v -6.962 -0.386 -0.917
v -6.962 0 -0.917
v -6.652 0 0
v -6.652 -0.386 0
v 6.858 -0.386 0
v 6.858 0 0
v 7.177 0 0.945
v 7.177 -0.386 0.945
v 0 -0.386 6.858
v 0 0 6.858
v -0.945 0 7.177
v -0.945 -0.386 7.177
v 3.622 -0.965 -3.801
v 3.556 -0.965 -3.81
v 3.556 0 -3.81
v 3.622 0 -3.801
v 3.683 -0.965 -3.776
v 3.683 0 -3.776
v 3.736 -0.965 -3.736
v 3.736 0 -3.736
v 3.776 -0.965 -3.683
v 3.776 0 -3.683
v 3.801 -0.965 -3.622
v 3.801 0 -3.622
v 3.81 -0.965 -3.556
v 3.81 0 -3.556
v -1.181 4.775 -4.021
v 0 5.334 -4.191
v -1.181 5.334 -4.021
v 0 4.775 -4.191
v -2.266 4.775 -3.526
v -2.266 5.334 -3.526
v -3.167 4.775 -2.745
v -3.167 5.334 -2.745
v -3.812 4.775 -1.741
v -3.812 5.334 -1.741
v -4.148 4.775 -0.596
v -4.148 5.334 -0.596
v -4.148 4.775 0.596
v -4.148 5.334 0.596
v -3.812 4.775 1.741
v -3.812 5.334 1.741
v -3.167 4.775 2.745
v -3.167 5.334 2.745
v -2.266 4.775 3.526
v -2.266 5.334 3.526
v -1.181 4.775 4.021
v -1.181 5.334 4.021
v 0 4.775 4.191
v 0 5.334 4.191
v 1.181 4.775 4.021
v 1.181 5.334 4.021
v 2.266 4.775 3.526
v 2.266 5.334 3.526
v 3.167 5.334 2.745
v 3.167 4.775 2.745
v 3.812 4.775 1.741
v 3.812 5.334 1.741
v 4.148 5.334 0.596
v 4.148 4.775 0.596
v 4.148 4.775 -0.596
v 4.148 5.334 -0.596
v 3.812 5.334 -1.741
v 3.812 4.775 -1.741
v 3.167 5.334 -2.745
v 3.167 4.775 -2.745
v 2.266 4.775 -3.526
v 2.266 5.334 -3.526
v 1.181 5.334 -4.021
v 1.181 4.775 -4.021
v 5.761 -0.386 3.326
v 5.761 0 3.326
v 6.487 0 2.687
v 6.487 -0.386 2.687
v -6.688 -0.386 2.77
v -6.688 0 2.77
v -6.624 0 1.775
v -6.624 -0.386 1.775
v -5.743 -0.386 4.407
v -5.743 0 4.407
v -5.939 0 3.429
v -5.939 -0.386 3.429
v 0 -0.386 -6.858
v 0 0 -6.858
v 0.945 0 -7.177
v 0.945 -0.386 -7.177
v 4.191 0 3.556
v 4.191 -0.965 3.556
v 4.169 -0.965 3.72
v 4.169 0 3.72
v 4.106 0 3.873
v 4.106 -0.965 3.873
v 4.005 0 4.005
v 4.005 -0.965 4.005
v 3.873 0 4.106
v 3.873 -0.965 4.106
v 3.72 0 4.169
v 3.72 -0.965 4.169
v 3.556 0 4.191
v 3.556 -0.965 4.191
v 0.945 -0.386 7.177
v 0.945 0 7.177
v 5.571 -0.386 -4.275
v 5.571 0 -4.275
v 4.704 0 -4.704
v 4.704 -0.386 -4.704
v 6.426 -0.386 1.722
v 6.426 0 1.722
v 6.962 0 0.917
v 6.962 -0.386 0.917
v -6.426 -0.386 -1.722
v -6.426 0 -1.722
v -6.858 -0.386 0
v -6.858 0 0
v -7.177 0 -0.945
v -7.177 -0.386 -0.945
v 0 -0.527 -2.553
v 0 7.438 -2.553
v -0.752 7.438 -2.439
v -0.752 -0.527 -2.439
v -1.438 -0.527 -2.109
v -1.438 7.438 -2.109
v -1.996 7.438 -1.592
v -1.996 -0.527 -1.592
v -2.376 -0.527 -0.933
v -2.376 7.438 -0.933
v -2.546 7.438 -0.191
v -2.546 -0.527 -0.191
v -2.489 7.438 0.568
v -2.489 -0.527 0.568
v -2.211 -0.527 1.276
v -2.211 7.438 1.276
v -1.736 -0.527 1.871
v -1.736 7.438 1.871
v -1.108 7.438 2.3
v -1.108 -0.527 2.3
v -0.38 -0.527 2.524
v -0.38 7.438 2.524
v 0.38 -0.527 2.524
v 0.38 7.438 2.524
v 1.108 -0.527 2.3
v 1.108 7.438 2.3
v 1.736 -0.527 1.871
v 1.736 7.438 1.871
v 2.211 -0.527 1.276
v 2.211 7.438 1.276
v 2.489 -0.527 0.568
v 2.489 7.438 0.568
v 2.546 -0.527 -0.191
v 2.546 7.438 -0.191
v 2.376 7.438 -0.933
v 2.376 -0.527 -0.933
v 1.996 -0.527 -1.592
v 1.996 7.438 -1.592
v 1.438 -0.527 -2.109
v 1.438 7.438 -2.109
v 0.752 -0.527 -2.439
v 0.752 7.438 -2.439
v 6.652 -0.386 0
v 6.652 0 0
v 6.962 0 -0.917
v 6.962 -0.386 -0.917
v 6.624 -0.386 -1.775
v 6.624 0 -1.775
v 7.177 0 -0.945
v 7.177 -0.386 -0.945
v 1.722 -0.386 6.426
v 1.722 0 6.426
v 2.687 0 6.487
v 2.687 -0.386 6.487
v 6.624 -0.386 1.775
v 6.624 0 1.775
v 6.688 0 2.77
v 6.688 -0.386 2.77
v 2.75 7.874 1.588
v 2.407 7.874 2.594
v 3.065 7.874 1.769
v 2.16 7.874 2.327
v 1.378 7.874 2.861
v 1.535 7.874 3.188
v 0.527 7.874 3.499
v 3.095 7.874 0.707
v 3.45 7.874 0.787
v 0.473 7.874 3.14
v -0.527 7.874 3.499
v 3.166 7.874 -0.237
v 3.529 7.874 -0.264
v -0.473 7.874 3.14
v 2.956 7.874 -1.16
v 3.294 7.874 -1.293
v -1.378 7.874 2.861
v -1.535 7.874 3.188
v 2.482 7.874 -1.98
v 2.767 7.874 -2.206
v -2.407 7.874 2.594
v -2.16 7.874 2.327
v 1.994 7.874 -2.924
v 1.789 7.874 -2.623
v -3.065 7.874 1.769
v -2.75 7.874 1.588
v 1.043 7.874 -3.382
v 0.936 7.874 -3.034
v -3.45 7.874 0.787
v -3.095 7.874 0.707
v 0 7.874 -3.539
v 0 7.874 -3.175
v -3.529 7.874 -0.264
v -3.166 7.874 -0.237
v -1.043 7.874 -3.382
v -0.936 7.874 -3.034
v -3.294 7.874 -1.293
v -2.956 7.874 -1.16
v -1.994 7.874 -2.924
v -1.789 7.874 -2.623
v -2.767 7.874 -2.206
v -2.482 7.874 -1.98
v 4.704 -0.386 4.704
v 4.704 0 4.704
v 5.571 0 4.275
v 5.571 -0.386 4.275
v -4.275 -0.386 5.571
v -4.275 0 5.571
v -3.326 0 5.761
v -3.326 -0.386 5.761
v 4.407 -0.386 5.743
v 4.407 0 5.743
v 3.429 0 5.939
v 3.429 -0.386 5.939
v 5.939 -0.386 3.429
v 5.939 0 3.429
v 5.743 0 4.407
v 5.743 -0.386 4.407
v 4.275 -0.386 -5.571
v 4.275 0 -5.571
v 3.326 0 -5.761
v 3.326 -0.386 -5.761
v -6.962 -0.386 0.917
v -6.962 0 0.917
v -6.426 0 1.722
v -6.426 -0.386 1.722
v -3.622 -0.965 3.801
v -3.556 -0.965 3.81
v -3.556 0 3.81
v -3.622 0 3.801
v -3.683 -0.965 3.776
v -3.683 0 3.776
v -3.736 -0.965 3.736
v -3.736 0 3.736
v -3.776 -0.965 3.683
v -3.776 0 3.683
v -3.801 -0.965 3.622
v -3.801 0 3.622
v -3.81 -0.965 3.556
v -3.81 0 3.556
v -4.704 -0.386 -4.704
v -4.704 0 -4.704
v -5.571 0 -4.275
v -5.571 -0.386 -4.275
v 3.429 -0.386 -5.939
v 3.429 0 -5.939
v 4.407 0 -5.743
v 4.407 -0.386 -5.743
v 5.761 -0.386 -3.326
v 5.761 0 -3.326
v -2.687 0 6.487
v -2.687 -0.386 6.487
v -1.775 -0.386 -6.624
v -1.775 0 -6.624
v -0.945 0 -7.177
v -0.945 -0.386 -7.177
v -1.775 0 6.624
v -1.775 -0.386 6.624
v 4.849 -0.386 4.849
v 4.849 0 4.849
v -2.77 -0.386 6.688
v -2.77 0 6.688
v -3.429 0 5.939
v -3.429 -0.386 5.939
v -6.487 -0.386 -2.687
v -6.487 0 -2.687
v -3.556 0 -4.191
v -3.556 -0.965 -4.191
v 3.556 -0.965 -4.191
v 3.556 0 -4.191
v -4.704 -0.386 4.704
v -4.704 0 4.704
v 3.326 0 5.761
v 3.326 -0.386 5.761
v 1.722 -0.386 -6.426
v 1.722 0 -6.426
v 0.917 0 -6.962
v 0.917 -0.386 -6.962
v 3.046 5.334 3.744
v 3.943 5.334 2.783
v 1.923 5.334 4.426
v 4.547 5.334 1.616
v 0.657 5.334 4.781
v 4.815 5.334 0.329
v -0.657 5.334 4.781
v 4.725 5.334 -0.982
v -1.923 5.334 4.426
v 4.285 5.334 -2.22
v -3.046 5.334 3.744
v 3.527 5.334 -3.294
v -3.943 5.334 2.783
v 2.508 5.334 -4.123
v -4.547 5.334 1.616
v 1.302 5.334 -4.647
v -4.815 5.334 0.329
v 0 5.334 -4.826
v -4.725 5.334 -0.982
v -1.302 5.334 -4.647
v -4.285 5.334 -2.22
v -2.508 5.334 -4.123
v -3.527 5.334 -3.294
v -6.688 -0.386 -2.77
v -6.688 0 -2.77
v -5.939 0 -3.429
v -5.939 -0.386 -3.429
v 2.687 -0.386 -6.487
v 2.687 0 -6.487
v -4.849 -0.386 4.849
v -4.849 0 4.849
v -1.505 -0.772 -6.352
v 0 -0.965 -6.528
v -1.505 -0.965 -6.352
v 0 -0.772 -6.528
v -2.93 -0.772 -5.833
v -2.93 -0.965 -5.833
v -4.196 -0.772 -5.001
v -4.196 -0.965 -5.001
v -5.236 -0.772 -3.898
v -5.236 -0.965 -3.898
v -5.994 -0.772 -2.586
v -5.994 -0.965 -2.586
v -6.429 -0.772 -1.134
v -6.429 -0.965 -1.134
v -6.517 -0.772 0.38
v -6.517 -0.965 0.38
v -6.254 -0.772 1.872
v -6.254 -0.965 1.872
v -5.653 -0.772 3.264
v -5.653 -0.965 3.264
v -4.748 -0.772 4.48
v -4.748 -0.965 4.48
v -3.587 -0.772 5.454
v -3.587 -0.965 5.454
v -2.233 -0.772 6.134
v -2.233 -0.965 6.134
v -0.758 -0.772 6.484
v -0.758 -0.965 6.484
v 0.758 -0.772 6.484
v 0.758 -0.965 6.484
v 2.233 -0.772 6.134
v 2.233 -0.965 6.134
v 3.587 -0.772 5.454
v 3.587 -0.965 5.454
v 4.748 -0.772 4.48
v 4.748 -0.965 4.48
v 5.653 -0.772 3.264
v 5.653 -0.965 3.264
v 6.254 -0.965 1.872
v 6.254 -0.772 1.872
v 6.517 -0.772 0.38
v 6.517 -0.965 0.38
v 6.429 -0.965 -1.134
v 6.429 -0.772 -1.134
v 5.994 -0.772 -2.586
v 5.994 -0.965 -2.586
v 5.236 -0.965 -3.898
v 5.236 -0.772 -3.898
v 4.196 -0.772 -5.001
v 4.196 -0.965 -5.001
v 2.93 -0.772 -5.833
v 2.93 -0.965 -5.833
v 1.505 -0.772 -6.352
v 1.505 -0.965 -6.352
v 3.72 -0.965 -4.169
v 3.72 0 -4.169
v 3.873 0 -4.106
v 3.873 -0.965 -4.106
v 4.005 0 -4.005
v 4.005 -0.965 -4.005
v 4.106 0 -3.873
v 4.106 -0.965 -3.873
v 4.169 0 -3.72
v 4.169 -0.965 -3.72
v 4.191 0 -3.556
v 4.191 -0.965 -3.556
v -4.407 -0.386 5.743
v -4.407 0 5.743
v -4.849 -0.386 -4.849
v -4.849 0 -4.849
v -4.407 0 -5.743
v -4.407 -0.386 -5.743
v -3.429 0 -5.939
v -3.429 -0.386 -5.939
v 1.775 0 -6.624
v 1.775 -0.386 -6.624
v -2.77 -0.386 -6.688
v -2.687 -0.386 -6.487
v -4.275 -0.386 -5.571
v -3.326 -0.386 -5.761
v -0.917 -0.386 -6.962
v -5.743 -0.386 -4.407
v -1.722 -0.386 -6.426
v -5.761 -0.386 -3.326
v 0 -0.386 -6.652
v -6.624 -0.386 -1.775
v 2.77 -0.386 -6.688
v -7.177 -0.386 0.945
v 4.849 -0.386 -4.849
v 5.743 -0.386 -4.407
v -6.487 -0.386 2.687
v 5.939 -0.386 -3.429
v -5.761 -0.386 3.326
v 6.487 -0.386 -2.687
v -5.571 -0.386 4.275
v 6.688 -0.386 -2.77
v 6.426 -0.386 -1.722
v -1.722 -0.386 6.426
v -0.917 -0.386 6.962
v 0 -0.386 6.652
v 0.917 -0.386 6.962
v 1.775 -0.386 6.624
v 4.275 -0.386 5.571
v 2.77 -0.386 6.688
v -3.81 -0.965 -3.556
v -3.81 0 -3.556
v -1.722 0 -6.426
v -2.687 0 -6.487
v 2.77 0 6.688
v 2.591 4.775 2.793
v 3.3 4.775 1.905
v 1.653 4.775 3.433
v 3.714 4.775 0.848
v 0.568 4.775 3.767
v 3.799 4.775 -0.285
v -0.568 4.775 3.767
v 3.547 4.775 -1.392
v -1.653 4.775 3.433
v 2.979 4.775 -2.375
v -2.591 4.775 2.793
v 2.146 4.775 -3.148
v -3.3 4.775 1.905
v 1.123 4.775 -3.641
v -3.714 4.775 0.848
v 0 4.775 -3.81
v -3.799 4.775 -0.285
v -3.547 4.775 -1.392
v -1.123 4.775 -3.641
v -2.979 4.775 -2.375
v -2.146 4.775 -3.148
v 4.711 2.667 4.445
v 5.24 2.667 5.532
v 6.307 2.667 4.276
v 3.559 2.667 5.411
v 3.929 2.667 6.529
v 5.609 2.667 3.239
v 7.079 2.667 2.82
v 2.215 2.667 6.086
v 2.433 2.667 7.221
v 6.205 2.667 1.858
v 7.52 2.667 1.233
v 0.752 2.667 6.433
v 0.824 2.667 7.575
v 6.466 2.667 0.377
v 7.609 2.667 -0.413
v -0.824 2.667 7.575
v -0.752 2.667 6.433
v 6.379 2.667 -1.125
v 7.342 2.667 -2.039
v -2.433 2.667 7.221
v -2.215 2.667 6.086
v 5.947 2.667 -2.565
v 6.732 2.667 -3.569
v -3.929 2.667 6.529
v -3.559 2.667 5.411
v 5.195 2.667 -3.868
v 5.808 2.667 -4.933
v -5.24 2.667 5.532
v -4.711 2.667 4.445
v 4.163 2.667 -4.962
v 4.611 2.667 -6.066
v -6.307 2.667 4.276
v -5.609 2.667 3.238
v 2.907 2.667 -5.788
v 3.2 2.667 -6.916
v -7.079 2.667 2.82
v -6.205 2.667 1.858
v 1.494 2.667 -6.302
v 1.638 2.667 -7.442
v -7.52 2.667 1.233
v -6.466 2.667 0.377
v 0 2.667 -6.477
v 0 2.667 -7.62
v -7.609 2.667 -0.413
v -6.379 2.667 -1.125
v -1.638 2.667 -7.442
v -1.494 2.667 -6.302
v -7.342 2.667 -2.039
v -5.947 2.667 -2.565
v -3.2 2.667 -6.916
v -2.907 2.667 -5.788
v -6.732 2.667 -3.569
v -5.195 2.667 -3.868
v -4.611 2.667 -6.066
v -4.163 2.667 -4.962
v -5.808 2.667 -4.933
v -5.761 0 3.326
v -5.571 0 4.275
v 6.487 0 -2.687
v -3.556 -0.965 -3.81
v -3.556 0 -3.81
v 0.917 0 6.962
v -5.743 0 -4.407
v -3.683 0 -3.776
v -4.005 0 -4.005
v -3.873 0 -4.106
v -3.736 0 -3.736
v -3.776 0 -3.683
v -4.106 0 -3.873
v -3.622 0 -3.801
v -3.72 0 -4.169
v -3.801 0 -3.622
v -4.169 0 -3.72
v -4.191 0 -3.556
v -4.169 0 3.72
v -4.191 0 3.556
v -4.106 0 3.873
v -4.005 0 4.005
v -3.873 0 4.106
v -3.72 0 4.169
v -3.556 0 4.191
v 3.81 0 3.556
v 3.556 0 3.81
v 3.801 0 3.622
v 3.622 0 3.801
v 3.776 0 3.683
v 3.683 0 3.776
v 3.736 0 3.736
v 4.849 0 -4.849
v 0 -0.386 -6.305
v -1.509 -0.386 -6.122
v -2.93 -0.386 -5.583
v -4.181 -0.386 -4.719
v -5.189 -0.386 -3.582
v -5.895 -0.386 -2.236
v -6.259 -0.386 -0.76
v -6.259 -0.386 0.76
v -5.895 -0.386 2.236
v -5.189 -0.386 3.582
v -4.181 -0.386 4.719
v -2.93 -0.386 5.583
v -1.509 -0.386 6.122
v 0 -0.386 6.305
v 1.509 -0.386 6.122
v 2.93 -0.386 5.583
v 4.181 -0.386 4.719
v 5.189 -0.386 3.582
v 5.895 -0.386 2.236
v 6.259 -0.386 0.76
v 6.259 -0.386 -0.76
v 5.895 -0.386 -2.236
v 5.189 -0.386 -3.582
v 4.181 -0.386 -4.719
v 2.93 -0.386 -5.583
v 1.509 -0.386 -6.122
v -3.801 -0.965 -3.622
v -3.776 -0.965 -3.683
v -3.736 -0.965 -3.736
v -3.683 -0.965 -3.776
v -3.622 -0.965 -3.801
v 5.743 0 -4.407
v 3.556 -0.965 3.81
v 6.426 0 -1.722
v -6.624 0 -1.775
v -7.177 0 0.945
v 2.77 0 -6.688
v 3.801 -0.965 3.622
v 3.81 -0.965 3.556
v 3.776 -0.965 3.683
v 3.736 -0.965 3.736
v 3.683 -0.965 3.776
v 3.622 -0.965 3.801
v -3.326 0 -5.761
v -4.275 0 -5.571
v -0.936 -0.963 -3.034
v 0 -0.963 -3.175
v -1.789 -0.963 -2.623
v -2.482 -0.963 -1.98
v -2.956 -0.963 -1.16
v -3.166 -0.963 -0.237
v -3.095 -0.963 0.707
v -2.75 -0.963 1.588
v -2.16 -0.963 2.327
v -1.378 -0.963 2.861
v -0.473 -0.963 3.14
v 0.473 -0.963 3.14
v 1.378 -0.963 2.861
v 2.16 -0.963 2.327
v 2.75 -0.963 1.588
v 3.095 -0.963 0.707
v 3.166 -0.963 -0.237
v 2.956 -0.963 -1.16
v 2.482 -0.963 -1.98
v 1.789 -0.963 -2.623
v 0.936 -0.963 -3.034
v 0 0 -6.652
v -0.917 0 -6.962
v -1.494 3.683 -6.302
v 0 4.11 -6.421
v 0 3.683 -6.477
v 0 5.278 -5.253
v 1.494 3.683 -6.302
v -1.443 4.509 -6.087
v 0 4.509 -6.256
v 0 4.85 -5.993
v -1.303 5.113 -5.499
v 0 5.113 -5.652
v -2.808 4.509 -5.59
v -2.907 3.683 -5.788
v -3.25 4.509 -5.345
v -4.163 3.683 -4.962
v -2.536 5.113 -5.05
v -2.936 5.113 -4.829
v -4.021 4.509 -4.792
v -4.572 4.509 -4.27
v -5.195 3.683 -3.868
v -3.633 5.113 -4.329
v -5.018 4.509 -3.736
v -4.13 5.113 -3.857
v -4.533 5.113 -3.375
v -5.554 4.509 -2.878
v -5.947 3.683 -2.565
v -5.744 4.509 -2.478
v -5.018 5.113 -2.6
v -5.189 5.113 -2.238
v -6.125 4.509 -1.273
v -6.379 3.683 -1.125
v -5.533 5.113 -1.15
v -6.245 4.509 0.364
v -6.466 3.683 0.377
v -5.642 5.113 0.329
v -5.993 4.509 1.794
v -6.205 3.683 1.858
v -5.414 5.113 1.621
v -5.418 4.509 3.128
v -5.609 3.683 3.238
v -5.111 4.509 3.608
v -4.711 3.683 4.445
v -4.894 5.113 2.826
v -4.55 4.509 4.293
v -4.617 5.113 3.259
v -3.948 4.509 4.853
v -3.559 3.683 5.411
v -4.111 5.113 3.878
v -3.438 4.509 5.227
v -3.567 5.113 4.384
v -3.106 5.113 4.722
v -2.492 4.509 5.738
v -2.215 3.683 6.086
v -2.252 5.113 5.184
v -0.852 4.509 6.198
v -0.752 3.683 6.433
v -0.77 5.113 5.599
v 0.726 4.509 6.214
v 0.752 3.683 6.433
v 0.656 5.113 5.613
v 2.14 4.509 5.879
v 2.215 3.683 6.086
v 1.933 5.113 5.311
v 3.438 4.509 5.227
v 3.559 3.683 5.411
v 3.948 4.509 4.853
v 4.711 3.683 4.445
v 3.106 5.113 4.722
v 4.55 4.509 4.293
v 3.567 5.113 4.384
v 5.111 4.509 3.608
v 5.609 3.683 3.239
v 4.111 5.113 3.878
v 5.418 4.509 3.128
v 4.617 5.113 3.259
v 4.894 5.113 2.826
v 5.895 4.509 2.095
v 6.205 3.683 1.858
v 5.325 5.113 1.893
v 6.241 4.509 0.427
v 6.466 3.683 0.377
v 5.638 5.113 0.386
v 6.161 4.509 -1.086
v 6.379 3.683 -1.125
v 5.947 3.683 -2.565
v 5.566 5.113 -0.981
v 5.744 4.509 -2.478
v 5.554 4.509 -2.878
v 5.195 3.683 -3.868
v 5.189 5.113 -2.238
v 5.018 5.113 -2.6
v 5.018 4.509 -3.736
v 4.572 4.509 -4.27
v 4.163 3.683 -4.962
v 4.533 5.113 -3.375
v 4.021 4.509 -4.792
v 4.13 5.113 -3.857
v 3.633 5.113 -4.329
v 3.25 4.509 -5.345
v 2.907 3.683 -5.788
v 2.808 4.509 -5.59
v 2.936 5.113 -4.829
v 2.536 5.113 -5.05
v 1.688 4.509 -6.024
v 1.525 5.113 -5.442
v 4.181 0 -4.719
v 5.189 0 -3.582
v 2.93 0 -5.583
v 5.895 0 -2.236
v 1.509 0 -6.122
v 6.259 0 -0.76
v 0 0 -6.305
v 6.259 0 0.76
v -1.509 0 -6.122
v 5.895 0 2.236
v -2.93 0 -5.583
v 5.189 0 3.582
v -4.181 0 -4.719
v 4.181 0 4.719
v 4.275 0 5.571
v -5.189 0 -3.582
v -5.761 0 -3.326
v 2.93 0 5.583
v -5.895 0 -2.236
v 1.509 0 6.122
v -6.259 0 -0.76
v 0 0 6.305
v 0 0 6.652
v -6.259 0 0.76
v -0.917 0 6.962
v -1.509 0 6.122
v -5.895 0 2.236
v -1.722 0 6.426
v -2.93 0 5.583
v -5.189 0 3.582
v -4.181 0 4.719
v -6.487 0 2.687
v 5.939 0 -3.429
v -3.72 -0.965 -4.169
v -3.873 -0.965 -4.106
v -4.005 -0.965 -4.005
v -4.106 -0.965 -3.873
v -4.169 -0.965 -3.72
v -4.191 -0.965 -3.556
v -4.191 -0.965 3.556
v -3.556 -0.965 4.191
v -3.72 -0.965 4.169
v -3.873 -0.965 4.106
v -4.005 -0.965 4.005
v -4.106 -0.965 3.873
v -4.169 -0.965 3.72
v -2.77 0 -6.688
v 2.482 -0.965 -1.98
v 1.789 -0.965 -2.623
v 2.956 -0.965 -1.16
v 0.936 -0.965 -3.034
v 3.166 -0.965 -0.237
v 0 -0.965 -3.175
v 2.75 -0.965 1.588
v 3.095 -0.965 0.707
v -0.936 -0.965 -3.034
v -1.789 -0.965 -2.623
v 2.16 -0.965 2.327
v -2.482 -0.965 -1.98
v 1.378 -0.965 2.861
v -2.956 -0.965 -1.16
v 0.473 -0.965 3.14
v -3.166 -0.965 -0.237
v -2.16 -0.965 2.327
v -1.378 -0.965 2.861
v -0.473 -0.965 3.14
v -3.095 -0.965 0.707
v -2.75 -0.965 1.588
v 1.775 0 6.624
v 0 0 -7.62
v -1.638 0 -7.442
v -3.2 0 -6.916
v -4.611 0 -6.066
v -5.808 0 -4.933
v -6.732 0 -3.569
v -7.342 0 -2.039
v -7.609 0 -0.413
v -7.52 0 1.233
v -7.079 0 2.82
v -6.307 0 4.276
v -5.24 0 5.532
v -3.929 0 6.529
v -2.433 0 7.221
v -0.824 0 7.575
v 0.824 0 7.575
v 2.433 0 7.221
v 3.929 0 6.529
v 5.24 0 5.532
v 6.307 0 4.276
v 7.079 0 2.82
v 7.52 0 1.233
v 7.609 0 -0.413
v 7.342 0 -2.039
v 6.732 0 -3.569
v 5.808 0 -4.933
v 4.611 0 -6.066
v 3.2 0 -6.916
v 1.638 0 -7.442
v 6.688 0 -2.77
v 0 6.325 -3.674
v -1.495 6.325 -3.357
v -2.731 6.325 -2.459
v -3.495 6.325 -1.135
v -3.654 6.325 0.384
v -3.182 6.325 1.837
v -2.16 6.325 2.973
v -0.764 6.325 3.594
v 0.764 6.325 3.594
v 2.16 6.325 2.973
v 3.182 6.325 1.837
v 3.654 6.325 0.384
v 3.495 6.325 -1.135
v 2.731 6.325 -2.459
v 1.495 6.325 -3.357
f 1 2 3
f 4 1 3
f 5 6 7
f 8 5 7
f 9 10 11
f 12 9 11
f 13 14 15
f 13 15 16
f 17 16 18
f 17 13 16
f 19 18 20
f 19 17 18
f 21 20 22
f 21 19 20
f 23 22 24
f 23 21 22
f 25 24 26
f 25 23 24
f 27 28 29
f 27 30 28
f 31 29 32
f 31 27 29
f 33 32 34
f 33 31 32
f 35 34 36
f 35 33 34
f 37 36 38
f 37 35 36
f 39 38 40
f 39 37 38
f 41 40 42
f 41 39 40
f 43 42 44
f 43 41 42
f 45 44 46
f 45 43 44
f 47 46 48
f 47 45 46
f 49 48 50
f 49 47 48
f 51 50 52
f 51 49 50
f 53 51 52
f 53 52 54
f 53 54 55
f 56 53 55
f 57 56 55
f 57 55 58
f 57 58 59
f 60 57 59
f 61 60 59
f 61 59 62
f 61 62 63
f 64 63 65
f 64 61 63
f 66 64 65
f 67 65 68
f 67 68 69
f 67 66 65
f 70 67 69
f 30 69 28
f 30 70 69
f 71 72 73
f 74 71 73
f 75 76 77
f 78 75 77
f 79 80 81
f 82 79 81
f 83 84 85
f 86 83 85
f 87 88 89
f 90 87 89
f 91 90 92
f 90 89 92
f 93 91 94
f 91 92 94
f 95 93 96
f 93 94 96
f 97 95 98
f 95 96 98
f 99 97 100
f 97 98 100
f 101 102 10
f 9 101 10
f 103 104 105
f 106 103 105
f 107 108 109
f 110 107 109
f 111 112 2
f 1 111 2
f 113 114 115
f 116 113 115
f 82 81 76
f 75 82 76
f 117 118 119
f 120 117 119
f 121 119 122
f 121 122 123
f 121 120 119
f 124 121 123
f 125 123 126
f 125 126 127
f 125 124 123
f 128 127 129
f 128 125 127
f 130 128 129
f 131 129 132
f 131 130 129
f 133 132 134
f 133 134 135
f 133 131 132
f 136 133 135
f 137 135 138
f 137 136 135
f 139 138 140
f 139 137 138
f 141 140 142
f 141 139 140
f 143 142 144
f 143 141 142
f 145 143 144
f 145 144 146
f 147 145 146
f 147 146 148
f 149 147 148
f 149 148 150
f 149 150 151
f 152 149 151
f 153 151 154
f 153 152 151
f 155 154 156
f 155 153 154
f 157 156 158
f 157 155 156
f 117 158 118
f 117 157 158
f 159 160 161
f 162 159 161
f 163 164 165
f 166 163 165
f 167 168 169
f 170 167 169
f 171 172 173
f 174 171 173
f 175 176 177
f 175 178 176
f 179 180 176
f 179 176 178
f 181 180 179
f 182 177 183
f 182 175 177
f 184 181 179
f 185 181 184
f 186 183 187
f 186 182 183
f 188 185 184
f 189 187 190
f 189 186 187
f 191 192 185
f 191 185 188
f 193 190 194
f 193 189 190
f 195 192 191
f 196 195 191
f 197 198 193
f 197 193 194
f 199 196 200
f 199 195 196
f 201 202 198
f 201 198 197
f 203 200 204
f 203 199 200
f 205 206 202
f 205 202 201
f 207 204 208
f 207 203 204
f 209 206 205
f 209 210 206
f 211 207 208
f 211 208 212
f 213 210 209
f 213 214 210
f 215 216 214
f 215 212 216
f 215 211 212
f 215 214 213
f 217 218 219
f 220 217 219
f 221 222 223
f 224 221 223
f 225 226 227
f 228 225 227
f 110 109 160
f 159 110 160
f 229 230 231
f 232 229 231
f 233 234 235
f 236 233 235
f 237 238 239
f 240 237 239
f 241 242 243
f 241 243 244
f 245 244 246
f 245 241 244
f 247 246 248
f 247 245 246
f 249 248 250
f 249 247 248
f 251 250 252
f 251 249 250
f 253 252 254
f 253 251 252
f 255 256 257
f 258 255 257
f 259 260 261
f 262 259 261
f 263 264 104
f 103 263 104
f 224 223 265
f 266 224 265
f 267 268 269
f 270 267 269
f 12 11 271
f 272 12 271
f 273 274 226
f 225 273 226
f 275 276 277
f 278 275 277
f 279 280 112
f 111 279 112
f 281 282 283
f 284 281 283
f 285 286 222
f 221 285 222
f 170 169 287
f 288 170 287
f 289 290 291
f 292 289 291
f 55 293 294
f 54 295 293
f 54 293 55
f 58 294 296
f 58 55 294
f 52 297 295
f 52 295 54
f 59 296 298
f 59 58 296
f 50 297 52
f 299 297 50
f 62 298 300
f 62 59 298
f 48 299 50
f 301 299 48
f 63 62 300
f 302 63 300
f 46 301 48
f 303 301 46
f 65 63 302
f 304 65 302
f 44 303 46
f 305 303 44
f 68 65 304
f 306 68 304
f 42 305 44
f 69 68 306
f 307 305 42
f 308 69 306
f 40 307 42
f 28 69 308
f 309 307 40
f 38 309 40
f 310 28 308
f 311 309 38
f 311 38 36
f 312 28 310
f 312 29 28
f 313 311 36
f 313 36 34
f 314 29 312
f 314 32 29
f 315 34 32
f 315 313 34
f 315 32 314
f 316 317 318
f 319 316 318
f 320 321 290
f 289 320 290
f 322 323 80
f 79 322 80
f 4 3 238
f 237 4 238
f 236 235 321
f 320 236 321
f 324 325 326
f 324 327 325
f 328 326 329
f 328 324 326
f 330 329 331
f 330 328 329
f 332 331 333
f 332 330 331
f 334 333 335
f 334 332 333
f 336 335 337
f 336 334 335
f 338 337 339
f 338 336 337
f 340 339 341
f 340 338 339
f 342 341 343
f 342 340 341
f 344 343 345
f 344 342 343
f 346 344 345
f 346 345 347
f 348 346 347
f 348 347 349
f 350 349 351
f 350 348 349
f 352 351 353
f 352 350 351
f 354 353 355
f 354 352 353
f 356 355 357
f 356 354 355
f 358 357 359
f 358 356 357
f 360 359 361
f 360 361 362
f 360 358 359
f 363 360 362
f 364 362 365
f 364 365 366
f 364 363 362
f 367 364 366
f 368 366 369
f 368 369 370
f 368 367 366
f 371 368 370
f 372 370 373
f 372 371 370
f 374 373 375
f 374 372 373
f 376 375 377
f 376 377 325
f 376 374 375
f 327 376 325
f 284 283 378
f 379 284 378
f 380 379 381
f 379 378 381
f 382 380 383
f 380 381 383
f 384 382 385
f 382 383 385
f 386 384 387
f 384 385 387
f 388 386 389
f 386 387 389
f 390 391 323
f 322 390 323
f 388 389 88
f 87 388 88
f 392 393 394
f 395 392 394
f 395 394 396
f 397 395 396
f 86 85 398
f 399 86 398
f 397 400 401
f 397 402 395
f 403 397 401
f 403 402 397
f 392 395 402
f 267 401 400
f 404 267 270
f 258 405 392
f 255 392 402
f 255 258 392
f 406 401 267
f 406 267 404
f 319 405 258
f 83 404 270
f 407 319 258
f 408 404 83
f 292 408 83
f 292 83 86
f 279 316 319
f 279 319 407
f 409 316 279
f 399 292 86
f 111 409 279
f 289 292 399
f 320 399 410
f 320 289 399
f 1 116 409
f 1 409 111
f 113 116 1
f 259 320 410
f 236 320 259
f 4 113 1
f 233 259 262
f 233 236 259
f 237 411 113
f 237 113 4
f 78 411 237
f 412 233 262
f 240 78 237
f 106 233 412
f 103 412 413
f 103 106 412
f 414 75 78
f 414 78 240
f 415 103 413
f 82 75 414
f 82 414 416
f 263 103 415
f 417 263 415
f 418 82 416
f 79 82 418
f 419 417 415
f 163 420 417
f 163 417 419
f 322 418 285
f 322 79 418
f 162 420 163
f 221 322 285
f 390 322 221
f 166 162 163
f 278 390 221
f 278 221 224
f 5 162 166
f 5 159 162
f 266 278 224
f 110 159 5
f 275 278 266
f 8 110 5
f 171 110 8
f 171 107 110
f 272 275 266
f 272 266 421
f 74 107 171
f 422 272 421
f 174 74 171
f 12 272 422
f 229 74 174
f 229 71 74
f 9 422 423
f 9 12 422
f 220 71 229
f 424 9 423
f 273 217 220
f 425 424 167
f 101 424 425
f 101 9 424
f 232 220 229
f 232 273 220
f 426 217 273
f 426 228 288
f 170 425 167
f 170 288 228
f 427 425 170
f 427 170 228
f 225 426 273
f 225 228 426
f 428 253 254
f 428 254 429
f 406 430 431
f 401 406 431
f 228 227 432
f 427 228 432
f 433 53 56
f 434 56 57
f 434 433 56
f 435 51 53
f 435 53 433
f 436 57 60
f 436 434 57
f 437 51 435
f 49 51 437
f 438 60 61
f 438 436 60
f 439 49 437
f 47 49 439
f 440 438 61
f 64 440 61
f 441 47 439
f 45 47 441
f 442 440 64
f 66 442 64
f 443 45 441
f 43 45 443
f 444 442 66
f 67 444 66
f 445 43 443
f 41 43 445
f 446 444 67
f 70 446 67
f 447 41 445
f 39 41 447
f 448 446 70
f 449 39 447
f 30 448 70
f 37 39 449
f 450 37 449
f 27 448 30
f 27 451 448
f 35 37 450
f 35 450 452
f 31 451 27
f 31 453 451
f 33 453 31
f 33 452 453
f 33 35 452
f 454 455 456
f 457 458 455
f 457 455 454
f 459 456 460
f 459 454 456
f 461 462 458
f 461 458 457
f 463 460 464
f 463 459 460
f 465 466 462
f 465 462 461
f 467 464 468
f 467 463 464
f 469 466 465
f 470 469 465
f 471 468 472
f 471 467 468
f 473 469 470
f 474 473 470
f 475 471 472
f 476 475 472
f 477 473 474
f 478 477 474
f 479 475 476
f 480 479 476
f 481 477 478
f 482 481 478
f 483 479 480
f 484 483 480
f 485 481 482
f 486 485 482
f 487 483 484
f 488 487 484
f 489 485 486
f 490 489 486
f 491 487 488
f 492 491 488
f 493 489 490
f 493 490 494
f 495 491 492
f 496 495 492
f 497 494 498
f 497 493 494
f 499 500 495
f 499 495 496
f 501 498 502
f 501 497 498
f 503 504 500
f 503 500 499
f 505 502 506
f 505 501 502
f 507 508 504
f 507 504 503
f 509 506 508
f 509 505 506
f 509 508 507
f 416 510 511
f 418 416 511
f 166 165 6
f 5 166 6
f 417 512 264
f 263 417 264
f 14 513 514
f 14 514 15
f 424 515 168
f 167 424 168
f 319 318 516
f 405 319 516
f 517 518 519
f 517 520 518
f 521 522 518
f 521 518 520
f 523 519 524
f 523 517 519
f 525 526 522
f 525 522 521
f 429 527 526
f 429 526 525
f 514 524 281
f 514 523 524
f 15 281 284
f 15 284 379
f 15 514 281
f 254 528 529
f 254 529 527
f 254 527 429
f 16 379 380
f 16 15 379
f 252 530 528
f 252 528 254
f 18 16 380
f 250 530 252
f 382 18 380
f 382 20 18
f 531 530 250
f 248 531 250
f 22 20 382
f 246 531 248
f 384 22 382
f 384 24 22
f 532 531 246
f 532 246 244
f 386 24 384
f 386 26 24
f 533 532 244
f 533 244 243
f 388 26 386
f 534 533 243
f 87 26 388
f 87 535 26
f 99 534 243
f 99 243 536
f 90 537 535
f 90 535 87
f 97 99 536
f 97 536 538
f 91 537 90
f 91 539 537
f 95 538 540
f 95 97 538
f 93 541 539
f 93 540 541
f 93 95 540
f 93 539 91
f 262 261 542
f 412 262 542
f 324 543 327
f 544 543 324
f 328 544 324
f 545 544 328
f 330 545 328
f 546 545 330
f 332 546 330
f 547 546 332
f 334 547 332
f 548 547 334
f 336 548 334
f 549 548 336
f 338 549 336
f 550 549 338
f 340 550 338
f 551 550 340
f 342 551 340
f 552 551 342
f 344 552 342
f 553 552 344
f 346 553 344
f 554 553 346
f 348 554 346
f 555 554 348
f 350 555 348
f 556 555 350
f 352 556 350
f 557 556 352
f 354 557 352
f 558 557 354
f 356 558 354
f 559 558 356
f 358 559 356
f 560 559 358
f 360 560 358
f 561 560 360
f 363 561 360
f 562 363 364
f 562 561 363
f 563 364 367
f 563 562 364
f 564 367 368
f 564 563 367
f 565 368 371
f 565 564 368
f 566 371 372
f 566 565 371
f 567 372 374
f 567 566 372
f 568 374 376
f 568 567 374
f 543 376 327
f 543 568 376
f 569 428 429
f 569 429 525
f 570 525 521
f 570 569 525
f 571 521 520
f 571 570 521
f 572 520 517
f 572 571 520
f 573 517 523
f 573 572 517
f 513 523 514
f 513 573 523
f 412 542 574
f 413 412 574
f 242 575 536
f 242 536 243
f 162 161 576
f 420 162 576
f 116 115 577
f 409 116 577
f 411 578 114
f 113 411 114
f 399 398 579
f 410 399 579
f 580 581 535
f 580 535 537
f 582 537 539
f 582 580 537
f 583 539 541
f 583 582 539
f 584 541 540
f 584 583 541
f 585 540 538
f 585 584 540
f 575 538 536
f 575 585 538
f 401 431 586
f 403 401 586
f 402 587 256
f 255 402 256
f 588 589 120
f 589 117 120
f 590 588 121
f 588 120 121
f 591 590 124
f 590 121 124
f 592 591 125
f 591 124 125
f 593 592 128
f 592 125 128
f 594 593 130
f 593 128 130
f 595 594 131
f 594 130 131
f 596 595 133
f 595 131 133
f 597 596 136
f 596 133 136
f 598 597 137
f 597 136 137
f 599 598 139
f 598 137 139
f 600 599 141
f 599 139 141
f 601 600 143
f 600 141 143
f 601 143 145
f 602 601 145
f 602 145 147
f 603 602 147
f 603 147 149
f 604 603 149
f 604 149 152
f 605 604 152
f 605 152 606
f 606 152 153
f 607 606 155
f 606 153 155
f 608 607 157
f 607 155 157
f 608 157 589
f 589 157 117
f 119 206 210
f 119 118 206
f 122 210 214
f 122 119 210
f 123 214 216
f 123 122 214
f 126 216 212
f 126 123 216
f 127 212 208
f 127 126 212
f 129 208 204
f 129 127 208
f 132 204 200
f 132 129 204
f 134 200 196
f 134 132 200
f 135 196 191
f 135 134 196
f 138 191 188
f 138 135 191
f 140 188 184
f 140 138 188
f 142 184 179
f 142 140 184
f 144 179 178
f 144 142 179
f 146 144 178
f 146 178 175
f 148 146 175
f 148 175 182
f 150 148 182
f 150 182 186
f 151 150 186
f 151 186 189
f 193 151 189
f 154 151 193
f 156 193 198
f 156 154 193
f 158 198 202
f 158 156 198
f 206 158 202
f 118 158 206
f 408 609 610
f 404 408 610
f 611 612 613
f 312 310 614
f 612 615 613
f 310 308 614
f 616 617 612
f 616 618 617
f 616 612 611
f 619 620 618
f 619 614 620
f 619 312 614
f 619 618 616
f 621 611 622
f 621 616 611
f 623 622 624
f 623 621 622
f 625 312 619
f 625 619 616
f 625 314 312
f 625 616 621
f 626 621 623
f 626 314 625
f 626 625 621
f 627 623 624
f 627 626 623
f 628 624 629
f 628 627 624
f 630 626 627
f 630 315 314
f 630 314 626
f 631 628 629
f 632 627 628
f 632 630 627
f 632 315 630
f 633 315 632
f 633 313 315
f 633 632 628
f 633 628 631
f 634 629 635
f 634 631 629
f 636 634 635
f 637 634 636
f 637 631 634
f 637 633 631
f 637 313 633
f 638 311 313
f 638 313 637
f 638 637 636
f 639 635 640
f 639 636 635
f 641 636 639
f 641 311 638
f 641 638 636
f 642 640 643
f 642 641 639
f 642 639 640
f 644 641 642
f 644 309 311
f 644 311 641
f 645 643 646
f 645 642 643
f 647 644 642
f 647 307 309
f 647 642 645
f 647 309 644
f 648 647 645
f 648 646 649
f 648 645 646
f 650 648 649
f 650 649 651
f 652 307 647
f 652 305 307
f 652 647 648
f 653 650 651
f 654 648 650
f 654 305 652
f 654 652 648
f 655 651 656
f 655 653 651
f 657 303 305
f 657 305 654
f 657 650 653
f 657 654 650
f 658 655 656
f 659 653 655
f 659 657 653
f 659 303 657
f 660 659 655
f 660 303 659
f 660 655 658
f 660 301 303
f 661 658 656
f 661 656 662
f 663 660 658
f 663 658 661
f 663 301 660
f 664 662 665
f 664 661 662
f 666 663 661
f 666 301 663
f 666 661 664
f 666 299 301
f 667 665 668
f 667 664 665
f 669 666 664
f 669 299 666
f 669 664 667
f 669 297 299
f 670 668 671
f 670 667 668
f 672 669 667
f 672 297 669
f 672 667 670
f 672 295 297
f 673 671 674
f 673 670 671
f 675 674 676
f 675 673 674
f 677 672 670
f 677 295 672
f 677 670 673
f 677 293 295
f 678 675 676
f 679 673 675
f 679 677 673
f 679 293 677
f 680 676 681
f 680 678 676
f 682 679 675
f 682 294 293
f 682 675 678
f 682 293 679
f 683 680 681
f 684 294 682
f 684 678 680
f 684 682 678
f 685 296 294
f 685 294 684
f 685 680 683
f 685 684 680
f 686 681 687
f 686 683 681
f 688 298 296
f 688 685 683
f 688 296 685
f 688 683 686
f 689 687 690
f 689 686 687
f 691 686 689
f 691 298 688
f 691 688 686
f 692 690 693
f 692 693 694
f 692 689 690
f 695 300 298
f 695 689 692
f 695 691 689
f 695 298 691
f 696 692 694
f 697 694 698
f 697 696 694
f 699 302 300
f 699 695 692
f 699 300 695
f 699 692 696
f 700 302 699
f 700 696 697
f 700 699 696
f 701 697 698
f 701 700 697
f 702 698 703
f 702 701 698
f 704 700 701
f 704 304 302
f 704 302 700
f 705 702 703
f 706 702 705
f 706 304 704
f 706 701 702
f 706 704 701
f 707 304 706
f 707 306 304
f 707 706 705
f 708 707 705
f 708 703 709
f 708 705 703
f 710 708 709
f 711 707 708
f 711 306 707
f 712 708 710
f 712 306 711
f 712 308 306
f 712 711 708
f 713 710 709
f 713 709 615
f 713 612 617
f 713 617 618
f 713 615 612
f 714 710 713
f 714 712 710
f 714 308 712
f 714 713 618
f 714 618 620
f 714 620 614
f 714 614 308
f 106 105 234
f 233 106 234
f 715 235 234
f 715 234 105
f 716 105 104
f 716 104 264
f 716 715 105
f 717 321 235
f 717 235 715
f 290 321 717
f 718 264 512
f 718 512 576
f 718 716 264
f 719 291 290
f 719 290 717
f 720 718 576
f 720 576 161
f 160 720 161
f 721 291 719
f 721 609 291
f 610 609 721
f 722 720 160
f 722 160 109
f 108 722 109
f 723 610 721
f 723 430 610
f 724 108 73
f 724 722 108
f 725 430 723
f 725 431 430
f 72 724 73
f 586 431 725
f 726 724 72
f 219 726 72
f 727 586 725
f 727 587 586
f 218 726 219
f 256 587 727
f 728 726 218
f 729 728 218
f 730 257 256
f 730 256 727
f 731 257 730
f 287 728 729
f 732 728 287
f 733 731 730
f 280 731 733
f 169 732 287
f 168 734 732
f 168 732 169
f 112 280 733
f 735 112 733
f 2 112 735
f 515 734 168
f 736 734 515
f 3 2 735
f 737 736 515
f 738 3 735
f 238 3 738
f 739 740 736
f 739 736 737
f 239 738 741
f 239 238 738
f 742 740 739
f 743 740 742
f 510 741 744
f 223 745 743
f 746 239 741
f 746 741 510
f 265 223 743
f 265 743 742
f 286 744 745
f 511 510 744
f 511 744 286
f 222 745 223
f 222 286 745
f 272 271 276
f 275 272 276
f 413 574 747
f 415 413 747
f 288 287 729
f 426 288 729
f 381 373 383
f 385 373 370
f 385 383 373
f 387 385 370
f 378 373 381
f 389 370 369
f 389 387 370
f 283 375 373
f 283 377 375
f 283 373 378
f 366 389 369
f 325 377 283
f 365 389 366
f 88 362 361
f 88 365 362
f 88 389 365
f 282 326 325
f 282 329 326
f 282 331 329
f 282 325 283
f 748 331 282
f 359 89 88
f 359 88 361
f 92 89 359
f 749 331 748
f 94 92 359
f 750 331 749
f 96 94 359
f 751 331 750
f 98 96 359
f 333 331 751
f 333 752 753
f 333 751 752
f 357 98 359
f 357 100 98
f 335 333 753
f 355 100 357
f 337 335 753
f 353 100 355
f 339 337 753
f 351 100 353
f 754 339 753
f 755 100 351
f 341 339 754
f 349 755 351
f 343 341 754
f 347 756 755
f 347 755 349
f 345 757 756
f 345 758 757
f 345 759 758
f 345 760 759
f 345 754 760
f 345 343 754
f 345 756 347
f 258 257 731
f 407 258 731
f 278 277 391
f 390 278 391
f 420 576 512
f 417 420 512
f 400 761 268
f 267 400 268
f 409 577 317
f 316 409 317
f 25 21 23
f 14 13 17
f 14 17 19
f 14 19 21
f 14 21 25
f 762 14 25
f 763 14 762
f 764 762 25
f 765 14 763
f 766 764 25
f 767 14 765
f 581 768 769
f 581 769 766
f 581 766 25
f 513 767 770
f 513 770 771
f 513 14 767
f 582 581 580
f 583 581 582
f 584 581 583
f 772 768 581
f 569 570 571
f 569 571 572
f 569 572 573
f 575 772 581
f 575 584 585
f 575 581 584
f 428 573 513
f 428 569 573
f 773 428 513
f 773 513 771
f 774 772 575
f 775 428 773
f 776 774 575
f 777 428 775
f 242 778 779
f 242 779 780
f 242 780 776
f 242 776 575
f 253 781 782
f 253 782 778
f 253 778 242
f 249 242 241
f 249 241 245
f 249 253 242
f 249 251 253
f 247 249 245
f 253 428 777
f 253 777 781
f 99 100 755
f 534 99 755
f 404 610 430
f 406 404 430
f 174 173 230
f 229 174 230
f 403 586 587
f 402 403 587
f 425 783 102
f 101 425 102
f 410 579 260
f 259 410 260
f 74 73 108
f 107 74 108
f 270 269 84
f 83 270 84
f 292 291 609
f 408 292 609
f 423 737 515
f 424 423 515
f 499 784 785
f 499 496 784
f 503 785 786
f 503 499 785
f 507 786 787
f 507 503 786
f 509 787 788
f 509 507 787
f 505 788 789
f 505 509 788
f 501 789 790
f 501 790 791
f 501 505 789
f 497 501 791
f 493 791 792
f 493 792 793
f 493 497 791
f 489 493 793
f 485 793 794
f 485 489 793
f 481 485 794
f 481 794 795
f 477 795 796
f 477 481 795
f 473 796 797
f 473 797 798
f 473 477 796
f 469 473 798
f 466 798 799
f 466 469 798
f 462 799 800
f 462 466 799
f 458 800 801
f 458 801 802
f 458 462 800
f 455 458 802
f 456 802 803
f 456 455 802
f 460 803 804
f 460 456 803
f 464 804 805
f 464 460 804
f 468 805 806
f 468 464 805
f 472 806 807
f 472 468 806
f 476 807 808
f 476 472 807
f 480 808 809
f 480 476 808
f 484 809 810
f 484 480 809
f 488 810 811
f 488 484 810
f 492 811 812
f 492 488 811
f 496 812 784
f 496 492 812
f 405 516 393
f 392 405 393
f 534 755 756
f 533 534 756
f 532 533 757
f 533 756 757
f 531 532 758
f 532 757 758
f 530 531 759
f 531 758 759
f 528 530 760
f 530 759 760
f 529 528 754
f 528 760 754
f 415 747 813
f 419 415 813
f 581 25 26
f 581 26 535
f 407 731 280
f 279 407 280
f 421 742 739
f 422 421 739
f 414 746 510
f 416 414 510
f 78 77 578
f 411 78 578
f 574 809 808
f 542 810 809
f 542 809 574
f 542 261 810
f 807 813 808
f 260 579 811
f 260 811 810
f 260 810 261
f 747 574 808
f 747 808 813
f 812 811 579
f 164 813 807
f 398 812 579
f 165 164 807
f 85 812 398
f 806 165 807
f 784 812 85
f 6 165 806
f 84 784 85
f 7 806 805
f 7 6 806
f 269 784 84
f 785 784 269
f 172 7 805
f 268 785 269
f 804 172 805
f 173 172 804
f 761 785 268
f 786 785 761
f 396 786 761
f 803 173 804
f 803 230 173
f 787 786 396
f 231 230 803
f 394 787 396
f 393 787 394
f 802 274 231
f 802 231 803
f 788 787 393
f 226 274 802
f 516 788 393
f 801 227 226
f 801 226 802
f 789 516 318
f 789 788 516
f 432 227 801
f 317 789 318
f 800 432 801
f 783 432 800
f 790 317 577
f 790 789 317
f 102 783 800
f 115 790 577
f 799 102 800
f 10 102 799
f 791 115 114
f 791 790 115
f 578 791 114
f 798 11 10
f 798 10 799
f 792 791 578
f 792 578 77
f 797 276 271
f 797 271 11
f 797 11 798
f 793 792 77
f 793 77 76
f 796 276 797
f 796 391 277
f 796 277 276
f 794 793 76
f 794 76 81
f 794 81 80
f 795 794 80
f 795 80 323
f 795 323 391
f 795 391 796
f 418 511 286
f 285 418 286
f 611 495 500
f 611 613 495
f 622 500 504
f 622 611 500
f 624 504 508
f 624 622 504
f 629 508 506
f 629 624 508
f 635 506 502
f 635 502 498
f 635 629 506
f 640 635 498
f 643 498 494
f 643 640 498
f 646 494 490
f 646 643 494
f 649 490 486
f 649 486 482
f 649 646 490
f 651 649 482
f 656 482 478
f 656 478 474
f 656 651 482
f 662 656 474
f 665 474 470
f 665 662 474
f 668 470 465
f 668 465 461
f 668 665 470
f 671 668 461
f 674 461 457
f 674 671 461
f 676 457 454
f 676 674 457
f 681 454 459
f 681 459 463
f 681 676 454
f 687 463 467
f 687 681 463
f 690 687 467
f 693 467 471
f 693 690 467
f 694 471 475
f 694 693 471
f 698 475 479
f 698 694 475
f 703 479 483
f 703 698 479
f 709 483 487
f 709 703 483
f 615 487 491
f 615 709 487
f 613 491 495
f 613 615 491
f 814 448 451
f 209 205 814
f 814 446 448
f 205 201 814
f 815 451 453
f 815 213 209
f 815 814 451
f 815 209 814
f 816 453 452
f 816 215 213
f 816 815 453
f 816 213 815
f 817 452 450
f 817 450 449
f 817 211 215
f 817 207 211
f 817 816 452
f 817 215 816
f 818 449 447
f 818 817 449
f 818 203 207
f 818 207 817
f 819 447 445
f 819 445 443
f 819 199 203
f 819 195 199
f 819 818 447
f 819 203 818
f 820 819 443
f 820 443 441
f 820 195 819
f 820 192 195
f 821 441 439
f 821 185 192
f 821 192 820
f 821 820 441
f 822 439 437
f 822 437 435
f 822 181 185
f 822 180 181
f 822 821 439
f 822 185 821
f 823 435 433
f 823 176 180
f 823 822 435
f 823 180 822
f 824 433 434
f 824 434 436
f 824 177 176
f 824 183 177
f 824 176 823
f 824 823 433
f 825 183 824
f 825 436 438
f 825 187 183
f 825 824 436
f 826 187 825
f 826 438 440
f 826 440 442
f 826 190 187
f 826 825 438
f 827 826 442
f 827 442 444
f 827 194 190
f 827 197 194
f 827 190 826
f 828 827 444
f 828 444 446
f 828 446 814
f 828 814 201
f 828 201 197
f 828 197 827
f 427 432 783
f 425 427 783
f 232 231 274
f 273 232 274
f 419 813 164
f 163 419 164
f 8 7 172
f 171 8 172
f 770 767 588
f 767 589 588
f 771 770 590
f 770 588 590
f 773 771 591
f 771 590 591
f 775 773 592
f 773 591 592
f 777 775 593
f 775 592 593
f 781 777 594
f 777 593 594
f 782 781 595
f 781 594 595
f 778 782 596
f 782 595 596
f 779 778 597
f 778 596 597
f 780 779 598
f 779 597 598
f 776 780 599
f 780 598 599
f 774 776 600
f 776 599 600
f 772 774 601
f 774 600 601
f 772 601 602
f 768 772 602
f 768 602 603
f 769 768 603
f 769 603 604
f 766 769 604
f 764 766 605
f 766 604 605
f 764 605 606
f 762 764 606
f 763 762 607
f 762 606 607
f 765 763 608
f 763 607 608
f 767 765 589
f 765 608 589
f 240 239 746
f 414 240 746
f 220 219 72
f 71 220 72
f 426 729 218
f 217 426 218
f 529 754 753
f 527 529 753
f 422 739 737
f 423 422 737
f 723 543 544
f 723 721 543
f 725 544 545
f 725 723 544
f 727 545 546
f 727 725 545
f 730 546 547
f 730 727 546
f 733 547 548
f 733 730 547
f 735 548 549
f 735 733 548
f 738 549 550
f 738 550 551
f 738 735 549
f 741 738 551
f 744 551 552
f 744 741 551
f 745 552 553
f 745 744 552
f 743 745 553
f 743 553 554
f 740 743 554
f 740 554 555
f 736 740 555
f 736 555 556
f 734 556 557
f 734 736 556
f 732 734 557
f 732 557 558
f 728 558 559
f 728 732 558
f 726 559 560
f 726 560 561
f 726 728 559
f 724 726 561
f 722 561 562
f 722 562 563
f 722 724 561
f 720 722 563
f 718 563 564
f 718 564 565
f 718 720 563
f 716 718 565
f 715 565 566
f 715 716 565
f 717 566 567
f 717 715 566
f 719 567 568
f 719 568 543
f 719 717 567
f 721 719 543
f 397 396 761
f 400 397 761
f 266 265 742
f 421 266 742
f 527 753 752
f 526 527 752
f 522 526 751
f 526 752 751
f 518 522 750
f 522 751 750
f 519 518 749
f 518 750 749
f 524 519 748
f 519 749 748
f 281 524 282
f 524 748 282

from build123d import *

# Parameters (mm, degrees)
CLINCHINGRINGSEGMENT_DEPTH = 0.38608
CLINCHINGRING_COUNT        = 24
CLINCHINGRING_ANGLE        = 345
SQRCUT_DEPTH               = 0.9652


with BuildPart() as part:
    # BodySke → Body (revolve)
    with BuildSketch(Plane.XY, mode=Mode.PRIVATE) as body_sk:
        with BuildLine():
            Line((6.304896608, 0), (7.62, 0))
            Line((7.62, 0), (7.62, 2.667))
            Line((7.62, 2.667), (6.477, 2.667))
            Line((6.477, 2.667), (6.477, 3.683))
            ThreePointArc((6.477, 3.683), (5.993433296, 4.850433296), (4.826, 5.334))
            Line((4.826, 5.334), (4.191, 5.334))
            Line((4.191, 5.334), (4.191, 4.7752))
            Line((4.191, 4.7752), (3.81, 4.7752))
            Line((3.81, 4.7752), (3.538890129, 7.874))
            Line((3.538890129, 7.874), (2.5527, 7.874))
            Line((2.5527, 7.874), (2.5527, -0.9652))
            Line((2.5527, -0.9652), (6.5278, -0.9652))
            Line((6.5278, -0.9652), (6.5278, -0.77216))
            Line((6.5278, -0.77216), (6.304896608, -0.38608))
            Line((6.304896608, -0.38608), (6.304896608, 0))
        make_face()
    revolve(body_sk.sketch.rotate(Axis((0, 0, 0), (0, 1, 0)), 90), axis=Axis((0, 0, 0), (0, 1, 0)))

    # EndChamferSke → EndChamfer (revolve, cut)
    with BuildSketch(Plane.XY, mode=Mode.PRIVATE) as endchamfer_sk:
        Polygon((3.175, -1.2192), (3.175, -0.96266), (2.5527, -0.527082692), (2.5527, -1.2192), align=None)
        Polygon((3.175, 7.874), (2.5527, 7.438422692), (2.5527, 7.874), align=None)
    revolve(endchamfer_sk.sketch.rotate(Axis((0, -2.54, 0), (0, 1, 0)), 90), axis=Axis((0, -2.54, 0), (0, 1, 0)), mode=Mode.SUBTRACT)

    # CliRinSegSke → ClinchingRingSegment (add)
    with BuildSketch(Plane.XZ):
        Polygon((0.944879105, 7.177069351), (0, 6.858), (-0.944879105, 7.177069351), (-0.916532732, 6.961757271), (0, 6.65226), (0.916532732, 6.961757271), align=None)
    clinchingringsegment = extrude(amount=CLINCHINGRINGSEGMENT_DEPTH)

    # ClinchingRing: ClinchingRingSegment ×24 about axis
    clinchingring_axis = Axis((0, 0, 0), (0, 1, 0))
    for i in range(1, CLINCHINGRING_COUNT):
        add(clinchingringsegment.rotate(clinchingring_axis, i * CLINCHINGRING_ANGLE / (CLINCHINGRING_COUNT - 1)))

    # SqrCutSke → SqrCut (cut)
    with BuildSketch(Plane.XZ.offset(0.9652)):
        with BuildLine():
            Line((-3.556, -4.191), (3.556, -4.191))
            ThreePointArc((3.556, -4.191), (4.005012806, -4.005012806), (4.191, -3.556))
            Line((4.191, -3.556), (4.191, 3.556))
            ThreePointArc((4.191, 3.556), (4.005012806, 4.005012806), (3.556, 4.191))
            Line((3.556, 4.191), (-3.556, 4.191))
            ThreePointArc((-3.556, 4.191), (-4.005012806, 4.005012806), (-4.191, 3.556))
            Line((-4.191, 3.556), (-4.191, -3.556))
            ThreePointArc((-4.191, -3.556), (-4.005012806, -4.005012806), (-3.556, -4.191))
        make_face()
        with BuildLine():
            Line((3.81, -3.556), (3.81, 3.556))
            ThreePointArc((3.81, 3.556), (3.735605122, 3.735605122), (3.556, 3.81))
            Line((3.556, 3.81), (-3.556, 3.81))
            ThreePointArc((-3.556, 3.81), (-3.735605122, 3.735605122), (-3.81, 3.556))
            Line((-3.81, 3.556), (-3.81, -3.556))
            ThreePointArc((-3.81, -3.556), (-3.735605122, -3.735605122), (-3.556, -3.81))
            Line((-3.556, -3.81), (3.556, -3.81))
            ThreePointArc((3.556, -3.81), (3.735605122, -3.735605122), (3.81, -3.556))
        make_face(mode=Mode.SUBTRACT)
    extrude(amount=-SQRCUT_DEPTH, mode=Mode.SUBTRACT)


solid = part.part
